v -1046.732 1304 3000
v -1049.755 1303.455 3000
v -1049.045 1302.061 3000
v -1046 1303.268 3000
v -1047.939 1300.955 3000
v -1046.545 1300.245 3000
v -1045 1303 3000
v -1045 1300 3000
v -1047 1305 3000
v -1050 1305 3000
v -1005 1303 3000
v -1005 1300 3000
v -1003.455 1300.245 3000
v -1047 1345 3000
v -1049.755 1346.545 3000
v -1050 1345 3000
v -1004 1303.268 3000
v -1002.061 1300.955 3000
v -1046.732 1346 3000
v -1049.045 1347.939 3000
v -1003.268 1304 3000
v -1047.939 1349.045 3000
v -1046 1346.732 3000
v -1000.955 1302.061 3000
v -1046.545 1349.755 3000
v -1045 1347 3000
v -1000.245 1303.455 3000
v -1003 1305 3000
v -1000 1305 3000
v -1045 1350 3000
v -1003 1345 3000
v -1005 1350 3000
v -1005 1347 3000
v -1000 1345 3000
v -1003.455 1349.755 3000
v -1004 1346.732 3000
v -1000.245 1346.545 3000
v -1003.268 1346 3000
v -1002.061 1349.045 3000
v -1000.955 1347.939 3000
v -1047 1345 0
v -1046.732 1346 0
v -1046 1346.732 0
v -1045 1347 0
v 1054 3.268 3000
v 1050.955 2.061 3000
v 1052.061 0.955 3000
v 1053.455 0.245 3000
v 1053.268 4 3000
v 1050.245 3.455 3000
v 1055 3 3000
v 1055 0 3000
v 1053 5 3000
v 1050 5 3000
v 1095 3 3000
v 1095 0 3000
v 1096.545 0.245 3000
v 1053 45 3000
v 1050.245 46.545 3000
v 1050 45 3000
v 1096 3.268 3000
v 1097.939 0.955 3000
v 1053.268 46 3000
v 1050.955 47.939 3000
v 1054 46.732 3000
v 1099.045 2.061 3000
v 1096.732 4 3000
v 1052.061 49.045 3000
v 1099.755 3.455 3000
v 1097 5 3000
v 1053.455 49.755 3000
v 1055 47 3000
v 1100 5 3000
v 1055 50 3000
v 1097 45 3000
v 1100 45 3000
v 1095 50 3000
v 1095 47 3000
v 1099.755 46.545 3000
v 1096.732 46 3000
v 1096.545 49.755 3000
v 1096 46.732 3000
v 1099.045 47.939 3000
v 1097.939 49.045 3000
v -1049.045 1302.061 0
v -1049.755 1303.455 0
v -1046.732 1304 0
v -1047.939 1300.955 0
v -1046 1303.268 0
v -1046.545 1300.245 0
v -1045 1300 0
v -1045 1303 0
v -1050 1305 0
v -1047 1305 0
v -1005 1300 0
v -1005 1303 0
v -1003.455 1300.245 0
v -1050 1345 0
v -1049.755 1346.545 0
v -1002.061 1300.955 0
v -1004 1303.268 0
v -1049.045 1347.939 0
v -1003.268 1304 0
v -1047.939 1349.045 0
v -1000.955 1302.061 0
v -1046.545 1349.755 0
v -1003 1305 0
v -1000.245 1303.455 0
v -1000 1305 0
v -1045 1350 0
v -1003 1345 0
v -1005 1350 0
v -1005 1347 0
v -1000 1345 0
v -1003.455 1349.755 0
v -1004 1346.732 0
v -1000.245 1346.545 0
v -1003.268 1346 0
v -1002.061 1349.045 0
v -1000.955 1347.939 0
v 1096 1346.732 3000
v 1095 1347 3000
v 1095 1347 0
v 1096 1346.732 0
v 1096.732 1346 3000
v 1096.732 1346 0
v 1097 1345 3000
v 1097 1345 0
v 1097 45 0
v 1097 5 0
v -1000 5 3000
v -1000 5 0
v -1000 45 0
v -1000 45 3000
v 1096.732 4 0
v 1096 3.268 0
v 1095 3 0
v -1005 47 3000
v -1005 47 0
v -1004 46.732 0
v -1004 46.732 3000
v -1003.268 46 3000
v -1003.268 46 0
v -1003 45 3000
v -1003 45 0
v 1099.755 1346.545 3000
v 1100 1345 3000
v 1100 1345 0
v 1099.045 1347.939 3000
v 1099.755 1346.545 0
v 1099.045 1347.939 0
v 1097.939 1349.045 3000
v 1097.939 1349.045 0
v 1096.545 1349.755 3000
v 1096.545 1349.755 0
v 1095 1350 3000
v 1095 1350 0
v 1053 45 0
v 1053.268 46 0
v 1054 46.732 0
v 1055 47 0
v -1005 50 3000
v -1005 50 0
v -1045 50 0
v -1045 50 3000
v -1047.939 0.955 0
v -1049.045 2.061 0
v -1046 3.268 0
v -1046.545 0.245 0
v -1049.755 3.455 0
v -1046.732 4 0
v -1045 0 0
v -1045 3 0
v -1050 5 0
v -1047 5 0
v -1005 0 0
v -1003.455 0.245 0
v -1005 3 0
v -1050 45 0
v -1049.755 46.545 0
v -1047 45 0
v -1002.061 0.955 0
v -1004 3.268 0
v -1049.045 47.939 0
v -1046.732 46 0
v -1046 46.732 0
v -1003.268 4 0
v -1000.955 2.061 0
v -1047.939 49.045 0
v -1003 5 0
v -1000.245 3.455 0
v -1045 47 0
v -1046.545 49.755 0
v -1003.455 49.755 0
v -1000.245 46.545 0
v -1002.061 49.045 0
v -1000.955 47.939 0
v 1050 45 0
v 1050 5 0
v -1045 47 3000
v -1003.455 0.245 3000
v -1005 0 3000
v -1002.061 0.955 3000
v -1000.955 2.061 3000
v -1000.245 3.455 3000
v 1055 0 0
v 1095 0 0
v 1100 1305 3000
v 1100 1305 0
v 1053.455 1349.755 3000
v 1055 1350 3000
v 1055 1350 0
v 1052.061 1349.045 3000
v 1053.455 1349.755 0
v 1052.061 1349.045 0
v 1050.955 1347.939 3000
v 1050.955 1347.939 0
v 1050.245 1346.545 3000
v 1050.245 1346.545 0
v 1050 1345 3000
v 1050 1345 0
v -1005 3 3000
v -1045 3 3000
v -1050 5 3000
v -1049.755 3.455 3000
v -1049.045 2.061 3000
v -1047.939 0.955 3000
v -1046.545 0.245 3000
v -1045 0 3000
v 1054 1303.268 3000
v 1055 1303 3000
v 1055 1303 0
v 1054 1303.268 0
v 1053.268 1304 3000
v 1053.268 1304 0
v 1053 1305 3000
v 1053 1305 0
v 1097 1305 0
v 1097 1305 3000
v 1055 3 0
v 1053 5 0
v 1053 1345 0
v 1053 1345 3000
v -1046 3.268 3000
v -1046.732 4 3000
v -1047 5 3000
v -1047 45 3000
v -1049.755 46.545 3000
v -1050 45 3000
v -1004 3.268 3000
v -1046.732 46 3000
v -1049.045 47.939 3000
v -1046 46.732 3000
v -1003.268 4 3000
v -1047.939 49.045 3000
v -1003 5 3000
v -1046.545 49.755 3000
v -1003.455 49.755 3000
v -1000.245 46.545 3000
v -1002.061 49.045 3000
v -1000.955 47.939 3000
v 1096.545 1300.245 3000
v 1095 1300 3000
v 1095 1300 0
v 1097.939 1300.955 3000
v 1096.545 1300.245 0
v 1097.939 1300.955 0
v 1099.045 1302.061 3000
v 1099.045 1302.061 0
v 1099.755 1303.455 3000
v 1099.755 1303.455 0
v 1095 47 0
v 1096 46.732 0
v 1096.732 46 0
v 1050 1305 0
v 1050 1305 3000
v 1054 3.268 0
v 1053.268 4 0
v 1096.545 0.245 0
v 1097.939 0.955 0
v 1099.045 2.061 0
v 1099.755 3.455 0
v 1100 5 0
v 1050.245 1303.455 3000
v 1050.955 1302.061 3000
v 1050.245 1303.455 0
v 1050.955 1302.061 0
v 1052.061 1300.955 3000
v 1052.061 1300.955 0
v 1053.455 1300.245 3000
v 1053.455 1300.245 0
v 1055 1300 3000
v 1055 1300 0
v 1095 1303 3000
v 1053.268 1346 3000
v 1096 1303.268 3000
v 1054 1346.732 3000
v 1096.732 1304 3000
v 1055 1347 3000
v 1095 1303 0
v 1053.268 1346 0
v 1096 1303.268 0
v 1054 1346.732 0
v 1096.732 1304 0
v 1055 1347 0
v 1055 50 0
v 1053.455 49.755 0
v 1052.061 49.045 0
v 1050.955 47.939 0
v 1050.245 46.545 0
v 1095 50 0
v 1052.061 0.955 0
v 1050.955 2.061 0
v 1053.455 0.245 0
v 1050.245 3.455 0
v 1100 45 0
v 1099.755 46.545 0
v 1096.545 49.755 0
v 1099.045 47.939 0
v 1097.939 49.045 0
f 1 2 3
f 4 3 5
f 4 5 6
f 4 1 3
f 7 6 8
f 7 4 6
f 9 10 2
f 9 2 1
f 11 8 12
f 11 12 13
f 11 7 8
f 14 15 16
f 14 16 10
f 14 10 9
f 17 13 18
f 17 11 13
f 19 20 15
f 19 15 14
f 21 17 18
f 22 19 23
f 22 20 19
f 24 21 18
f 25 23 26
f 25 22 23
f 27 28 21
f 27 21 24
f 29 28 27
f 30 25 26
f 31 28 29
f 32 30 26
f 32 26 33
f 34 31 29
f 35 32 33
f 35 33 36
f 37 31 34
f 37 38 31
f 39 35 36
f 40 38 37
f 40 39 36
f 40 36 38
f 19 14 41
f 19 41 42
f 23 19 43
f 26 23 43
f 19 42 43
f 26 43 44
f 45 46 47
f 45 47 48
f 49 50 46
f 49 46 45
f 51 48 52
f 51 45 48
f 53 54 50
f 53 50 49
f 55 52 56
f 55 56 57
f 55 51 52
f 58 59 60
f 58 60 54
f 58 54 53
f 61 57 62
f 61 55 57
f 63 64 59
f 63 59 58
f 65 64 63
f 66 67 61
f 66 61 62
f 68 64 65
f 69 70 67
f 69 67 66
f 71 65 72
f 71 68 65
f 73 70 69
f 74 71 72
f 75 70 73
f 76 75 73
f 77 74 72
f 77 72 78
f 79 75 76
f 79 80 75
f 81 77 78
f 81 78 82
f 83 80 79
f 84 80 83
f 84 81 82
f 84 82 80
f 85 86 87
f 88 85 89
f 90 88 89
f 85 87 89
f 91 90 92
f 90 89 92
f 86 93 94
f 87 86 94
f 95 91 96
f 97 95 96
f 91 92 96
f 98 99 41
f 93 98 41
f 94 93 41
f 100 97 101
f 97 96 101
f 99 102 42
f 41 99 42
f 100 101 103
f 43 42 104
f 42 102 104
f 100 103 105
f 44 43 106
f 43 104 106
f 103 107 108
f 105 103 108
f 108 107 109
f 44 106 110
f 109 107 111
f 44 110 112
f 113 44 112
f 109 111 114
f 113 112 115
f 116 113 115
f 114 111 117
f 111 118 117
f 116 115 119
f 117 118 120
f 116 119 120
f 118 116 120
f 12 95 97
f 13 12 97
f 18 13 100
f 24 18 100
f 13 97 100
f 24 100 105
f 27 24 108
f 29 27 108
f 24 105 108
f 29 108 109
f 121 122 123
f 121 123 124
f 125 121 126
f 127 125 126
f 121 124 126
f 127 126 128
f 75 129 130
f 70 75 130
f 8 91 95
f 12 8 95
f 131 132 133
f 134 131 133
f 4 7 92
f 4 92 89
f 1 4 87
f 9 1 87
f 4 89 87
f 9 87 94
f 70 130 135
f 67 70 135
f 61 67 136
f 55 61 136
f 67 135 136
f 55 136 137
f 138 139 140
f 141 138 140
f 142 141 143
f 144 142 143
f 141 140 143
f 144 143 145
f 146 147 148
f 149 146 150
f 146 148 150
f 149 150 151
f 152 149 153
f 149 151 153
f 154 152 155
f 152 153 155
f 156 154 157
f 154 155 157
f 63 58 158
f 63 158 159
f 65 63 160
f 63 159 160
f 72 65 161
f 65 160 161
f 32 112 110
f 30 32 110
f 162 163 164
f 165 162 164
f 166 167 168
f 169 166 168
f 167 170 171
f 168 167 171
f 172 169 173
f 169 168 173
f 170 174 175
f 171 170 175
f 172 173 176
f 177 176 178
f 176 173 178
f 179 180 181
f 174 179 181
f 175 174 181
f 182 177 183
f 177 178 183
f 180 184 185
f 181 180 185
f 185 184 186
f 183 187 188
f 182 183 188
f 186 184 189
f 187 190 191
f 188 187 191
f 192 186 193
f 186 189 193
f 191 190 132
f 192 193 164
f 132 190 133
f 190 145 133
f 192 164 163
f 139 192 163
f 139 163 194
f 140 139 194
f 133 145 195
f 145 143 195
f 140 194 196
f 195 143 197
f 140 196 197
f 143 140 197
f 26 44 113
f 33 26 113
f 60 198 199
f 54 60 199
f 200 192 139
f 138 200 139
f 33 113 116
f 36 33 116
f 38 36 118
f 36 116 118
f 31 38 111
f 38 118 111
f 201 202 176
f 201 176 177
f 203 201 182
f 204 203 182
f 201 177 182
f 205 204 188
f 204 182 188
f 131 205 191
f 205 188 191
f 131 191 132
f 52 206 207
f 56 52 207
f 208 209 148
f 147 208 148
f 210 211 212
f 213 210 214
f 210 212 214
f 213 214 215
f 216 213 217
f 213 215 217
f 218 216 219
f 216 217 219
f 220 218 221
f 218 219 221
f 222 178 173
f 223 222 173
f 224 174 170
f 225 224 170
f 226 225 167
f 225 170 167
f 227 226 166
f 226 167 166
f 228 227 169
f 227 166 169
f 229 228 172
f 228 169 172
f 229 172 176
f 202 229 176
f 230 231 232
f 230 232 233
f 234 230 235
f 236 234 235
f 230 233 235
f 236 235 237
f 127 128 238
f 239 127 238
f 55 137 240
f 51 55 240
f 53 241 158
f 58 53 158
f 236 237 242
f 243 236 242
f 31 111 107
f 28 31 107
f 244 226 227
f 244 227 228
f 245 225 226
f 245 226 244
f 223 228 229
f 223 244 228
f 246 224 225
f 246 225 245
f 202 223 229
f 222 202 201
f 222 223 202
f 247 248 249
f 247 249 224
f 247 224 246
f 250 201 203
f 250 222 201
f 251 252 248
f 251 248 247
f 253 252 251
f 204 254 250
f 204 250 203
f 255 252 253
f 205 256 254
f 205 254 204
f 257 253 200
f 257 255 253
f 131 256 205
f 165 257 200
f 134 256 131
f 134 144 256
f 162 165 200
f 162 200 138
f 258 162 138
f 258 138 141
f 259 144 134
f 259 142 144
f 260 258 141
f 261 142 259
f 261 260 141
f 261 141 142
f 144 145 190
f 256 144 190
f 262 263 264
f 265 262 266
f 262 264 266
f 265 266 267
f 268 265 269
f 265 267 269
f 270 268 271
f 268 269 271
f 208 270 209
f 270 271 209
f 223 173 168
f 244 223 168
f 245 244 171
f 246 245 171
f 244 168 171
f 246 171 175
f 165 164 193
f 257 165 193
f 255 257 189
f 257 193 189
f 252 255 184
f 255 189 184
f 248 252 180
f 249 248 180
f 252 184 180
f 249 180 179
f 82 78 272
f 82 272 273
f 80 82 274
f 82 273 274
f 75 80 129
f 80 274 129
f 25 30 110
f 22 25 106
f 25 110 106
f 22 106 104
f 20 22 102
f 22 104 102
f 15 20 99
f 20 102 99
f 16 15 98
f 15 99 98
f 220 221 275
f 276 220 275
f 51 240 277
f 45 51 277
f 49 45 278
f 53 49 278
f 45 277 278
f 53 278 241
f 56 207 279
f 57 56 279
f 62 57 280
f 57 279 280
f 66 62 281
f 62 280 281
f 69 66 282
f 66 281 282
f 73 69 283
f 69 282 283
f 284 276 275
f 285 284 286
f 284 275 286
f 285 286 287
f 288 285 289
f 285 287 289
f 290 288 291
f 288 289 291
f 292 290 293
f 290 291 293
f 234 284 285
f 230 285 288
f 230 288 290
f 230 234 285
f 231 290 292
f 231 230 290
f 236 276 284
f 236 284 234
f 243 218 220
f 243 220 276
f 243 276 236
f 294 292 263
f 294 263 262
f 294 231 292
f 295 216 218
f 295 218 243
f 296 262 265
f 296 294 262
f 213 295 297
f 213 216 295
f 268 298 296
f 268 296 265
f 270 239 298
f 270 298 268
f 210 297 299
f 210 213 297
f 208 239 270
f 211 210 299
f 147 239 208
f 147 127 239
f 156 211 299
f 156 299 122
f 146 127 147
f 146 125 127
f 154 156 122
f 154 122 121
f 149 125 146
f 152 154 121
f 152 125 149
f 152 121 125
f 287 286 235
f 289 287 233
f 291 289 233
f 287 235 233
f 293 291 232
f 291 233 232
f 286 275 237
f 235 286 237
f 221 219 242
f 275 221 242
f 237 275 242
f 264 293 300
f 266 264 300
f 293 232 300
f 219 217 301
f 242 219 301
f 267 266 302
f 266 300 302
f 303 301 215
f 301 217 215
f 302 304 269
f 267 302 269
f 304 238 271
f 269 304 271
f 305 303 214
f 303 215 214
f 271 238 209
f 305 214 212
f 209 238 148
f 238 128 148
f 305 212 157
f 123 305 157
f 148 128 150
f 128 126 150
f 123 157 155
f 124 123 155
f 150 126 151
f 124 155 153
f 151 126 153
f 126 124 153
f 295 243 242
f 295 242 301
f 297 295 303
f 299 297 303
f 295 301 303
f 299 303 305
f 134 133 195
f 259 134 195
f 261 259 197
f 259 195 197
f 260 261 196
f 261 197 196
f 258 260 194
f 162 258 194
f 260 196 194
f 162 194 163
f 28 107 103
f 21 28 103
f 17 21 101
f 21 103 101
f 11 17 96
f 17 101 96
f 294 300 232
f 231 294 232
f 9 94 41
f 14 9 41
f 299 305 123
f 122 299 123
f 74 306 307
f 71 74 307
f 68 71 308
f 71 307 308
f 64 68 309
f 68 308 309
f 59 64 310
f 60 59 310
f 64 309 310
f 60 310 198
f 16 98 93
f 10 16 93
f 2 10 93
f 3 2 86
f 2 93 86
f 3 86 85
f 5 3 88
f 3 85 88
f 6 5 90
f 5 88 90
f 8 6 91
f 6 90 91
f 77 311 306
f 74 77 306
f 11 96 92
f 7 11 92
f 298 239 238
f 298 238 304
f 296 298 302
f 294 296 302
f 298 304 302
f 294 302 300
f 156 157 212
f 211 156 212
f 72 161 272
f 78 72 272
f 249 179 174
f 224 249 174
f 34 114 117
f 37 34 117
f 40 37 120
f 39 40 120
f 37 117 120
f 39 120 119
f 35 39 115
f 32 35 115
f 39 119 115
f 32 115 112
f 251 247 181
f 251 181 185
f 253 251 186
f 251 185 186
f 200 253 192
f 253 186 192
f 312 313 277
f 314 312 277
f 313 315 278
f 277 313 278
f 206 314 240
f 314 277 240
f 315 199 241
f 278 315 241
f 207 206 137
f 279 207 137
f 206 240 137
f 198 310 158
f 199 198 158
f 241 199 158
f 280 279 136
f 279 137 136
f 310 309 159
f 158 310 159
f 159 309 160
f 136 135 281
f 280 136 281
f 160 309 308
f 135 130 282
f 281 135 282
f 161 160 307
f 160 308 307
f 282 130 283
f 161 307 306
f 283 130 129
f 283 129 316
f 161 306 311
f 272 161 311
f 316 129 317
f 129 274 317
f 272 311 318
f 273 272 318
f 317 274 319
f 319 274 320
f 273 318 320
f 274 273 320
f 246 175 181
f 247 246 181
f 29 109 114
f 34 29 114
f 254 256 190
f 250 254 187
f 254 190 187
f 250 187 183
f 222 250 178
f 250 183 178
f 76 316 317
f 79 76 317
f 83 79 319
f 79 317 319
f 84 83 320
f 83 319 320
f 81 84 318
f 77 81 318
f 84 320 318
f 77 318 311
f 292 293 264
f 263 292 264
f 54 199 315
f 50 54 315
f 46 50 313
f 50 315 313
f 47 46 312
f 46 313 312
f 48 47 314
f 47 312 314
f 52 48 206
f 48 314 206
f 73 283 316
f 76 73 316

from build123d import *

# Parameters (mm, degrees)
F1_DEPTH = 3000


with BuildPart() as f1:
    # F0 (on Top) → F1 (new body)
    with BuildSketch(Plane.XY):
        with BuildLine():
            Line((-1005, 1350), (-1045, 1350))
            ThreePointArc((-1045, 1350), (-1048.535534, 1348.535534), (-1050, 1345))
            Line((-1050, 1345), (-1050, 1305))
            ThreePointArc((-1050, 1305), (-1048.535534, 1301.464466), (-1045, 1300))
            Line((-1045, 1300), (-1005, 1300))
            ThreePointArc((-1005, 1300), (-1001.464466, 1301.464466), (-1000, 1305))
            Line((-1000, 1305), (-1000, 1345))
            ThreePointArc((-1000, 1345), (-1001.464466, 1348.535534), (-1005, 1350))
        make_face()
        with BuildLine():
            ThreePointArc((-1005, 1347), (-1003.585786, 1346.414214), (-1003, 1345))
            Line((-1003, 1345), (-1003, 1305))
            ThreePointArc((-1003, 1305), (-1003.585786, 1303.585786), (-1005, 1303))
            Line((-1005, 1303), (-1045, 1303))
            ThreePointArc((-1045, 1303), (-1046.414214, 1303.585786), (-1047, 1305))
            Line((-1047, 1305), (-1047, 1345))
            ThreePointArc((-1047, 1345), (-1046.414214, 1346.414214), (-1045, 1347))
            Line((-1045, 1347), (-1005, 1347))
        make_face(mode=Mode.SUBTRACT)
        with BuildLine():
            Line((-1045, 0), (-1005, 0))
            ThreePointArc((-1005, 0), (-1001.464466, 1.464466), (-1000, 5))
            Line((-1000, 5), (-1000, 45))
            ThreePointArc((-1000, 45), (-1001.464466, 48.535534), (-1005, 50))
            Line((-1005, 50), (-1045, 50))
            ThreePointArc((-1045, 50), (-1048.535534, 48.535534), (-1050, 45))
            Line((-1050, 45), (-1050, 5))
            ThreePointArc((-1050, 5), (-1048.535534, 1.464466), (-1045, 0))
        make_face()
        with BuildLine():
            Line((-1005, 3), (-1045, 3))
            ThreePointArc((-1045, 3), (-1046.414214, 3.585786), (-1047, 5))
            Line((-1047, 5), (-1047, 45))
            ThreePointArc((-1047, 45), (-1046.414214, 46.414214), (-1045, 47))
            Line((-1045, 47), (-1005, 47))
            ThreePointArc((-1005, 47), (-1003.585786, 46.414214), (-1003, 45))
            Line((-1003, 45), (-1003, 5))
            ThreePointArc((-1003, 5), (-1003.585786, 3.585786), (-1005, 3))
        make_face(mode=Mode.SUBTRACT)
        with BuildLine():
            Line((1055, 1300), (1095, 1300))
            ThreePointArc((1095, 1300), (1098.535534, 1301.464466), (1100, 1305))
            Line((1100, 1305), (1100, 1345))
            ThreePointArc((1100, 1345), (1098.535534, 1348.535534), (1095, 1350))
            Line((1095, 1350), (1055, 1350))
            ThreePointArc((1055, 1350), (1051.464466, 1348.535534), (1050, 1345))
            Line((1050, 1345), (1050, 1305))
            ThreePointArc((1050, 1305), (1051.464466, 1301.464466), (1055, 1300))
        make_face()
        with BuildLine():
            Line((1095, 1303), (1055, 1303))
            ThreePointArc((1055, 1303), (1053.585786, 1303.585786), (1053, 1305))
            Line((1053, 1305), (1053, 1345))
            ThreePointArc((1053, 1345), (1053.585786, 1346.414214), (1055, 1347))
            Line((1055, 1347), (1095, 1347))
            ThreePointArc((1095, 1347), (1096.414214, 1346.414214), (1097, 1345))
            Line((1097, 1345), (1097, 1305))
            ThreePointArc((1097, 1305), (1096.414214, 1303.585786), (1095, 1303))
        make_face(mode=Mode.SUBTRACT)
        with BuildLine():
            Line((1055, 0), (1095, 0))
            ThreePointArc((1095, 0), (1098.535534, 1.464466), (1100, 5))
            Line((1100, 5), (1100, 45))
            ThreePointArc((1100, 45), (1098.535534, 48.535534), (1095, 50))
            Line((1095, 50), (1055, 50))
            ThreePointArc((1055, 50), (1051.464466, 48.535534), (1050, 45))
            Line((1050, 45), (1050, 5))
            ThreePointArc((1050, 5), (1051.464466, 1.464466), (1055, 0))
        make_face()
        with BuildLine():
            Line((1095, 3), (1055, 3))
            ThreePointArc((1055, 3), (1053.585786, 3.585786), (1053, 5))
            Line((1053, 5), (1053, 45))
            ThreePointArc((1053, 45), (1053.585786, 46.414214), (1055, 47))
            Line((1055, 47), (1095, 47))
            ThreePointArc((1095, 47), (1096.414214, 46.414214), (1097, 45))
            Line((1097, 45), (1097, 5))
            ThreePointArc((1097, 5), (1096.414214, 3.585786), (1095, 3))
        make_face(mode=Mode.SUBTRACT)
    extrude(amount=F1_DEPTH)


solid = f1.part
